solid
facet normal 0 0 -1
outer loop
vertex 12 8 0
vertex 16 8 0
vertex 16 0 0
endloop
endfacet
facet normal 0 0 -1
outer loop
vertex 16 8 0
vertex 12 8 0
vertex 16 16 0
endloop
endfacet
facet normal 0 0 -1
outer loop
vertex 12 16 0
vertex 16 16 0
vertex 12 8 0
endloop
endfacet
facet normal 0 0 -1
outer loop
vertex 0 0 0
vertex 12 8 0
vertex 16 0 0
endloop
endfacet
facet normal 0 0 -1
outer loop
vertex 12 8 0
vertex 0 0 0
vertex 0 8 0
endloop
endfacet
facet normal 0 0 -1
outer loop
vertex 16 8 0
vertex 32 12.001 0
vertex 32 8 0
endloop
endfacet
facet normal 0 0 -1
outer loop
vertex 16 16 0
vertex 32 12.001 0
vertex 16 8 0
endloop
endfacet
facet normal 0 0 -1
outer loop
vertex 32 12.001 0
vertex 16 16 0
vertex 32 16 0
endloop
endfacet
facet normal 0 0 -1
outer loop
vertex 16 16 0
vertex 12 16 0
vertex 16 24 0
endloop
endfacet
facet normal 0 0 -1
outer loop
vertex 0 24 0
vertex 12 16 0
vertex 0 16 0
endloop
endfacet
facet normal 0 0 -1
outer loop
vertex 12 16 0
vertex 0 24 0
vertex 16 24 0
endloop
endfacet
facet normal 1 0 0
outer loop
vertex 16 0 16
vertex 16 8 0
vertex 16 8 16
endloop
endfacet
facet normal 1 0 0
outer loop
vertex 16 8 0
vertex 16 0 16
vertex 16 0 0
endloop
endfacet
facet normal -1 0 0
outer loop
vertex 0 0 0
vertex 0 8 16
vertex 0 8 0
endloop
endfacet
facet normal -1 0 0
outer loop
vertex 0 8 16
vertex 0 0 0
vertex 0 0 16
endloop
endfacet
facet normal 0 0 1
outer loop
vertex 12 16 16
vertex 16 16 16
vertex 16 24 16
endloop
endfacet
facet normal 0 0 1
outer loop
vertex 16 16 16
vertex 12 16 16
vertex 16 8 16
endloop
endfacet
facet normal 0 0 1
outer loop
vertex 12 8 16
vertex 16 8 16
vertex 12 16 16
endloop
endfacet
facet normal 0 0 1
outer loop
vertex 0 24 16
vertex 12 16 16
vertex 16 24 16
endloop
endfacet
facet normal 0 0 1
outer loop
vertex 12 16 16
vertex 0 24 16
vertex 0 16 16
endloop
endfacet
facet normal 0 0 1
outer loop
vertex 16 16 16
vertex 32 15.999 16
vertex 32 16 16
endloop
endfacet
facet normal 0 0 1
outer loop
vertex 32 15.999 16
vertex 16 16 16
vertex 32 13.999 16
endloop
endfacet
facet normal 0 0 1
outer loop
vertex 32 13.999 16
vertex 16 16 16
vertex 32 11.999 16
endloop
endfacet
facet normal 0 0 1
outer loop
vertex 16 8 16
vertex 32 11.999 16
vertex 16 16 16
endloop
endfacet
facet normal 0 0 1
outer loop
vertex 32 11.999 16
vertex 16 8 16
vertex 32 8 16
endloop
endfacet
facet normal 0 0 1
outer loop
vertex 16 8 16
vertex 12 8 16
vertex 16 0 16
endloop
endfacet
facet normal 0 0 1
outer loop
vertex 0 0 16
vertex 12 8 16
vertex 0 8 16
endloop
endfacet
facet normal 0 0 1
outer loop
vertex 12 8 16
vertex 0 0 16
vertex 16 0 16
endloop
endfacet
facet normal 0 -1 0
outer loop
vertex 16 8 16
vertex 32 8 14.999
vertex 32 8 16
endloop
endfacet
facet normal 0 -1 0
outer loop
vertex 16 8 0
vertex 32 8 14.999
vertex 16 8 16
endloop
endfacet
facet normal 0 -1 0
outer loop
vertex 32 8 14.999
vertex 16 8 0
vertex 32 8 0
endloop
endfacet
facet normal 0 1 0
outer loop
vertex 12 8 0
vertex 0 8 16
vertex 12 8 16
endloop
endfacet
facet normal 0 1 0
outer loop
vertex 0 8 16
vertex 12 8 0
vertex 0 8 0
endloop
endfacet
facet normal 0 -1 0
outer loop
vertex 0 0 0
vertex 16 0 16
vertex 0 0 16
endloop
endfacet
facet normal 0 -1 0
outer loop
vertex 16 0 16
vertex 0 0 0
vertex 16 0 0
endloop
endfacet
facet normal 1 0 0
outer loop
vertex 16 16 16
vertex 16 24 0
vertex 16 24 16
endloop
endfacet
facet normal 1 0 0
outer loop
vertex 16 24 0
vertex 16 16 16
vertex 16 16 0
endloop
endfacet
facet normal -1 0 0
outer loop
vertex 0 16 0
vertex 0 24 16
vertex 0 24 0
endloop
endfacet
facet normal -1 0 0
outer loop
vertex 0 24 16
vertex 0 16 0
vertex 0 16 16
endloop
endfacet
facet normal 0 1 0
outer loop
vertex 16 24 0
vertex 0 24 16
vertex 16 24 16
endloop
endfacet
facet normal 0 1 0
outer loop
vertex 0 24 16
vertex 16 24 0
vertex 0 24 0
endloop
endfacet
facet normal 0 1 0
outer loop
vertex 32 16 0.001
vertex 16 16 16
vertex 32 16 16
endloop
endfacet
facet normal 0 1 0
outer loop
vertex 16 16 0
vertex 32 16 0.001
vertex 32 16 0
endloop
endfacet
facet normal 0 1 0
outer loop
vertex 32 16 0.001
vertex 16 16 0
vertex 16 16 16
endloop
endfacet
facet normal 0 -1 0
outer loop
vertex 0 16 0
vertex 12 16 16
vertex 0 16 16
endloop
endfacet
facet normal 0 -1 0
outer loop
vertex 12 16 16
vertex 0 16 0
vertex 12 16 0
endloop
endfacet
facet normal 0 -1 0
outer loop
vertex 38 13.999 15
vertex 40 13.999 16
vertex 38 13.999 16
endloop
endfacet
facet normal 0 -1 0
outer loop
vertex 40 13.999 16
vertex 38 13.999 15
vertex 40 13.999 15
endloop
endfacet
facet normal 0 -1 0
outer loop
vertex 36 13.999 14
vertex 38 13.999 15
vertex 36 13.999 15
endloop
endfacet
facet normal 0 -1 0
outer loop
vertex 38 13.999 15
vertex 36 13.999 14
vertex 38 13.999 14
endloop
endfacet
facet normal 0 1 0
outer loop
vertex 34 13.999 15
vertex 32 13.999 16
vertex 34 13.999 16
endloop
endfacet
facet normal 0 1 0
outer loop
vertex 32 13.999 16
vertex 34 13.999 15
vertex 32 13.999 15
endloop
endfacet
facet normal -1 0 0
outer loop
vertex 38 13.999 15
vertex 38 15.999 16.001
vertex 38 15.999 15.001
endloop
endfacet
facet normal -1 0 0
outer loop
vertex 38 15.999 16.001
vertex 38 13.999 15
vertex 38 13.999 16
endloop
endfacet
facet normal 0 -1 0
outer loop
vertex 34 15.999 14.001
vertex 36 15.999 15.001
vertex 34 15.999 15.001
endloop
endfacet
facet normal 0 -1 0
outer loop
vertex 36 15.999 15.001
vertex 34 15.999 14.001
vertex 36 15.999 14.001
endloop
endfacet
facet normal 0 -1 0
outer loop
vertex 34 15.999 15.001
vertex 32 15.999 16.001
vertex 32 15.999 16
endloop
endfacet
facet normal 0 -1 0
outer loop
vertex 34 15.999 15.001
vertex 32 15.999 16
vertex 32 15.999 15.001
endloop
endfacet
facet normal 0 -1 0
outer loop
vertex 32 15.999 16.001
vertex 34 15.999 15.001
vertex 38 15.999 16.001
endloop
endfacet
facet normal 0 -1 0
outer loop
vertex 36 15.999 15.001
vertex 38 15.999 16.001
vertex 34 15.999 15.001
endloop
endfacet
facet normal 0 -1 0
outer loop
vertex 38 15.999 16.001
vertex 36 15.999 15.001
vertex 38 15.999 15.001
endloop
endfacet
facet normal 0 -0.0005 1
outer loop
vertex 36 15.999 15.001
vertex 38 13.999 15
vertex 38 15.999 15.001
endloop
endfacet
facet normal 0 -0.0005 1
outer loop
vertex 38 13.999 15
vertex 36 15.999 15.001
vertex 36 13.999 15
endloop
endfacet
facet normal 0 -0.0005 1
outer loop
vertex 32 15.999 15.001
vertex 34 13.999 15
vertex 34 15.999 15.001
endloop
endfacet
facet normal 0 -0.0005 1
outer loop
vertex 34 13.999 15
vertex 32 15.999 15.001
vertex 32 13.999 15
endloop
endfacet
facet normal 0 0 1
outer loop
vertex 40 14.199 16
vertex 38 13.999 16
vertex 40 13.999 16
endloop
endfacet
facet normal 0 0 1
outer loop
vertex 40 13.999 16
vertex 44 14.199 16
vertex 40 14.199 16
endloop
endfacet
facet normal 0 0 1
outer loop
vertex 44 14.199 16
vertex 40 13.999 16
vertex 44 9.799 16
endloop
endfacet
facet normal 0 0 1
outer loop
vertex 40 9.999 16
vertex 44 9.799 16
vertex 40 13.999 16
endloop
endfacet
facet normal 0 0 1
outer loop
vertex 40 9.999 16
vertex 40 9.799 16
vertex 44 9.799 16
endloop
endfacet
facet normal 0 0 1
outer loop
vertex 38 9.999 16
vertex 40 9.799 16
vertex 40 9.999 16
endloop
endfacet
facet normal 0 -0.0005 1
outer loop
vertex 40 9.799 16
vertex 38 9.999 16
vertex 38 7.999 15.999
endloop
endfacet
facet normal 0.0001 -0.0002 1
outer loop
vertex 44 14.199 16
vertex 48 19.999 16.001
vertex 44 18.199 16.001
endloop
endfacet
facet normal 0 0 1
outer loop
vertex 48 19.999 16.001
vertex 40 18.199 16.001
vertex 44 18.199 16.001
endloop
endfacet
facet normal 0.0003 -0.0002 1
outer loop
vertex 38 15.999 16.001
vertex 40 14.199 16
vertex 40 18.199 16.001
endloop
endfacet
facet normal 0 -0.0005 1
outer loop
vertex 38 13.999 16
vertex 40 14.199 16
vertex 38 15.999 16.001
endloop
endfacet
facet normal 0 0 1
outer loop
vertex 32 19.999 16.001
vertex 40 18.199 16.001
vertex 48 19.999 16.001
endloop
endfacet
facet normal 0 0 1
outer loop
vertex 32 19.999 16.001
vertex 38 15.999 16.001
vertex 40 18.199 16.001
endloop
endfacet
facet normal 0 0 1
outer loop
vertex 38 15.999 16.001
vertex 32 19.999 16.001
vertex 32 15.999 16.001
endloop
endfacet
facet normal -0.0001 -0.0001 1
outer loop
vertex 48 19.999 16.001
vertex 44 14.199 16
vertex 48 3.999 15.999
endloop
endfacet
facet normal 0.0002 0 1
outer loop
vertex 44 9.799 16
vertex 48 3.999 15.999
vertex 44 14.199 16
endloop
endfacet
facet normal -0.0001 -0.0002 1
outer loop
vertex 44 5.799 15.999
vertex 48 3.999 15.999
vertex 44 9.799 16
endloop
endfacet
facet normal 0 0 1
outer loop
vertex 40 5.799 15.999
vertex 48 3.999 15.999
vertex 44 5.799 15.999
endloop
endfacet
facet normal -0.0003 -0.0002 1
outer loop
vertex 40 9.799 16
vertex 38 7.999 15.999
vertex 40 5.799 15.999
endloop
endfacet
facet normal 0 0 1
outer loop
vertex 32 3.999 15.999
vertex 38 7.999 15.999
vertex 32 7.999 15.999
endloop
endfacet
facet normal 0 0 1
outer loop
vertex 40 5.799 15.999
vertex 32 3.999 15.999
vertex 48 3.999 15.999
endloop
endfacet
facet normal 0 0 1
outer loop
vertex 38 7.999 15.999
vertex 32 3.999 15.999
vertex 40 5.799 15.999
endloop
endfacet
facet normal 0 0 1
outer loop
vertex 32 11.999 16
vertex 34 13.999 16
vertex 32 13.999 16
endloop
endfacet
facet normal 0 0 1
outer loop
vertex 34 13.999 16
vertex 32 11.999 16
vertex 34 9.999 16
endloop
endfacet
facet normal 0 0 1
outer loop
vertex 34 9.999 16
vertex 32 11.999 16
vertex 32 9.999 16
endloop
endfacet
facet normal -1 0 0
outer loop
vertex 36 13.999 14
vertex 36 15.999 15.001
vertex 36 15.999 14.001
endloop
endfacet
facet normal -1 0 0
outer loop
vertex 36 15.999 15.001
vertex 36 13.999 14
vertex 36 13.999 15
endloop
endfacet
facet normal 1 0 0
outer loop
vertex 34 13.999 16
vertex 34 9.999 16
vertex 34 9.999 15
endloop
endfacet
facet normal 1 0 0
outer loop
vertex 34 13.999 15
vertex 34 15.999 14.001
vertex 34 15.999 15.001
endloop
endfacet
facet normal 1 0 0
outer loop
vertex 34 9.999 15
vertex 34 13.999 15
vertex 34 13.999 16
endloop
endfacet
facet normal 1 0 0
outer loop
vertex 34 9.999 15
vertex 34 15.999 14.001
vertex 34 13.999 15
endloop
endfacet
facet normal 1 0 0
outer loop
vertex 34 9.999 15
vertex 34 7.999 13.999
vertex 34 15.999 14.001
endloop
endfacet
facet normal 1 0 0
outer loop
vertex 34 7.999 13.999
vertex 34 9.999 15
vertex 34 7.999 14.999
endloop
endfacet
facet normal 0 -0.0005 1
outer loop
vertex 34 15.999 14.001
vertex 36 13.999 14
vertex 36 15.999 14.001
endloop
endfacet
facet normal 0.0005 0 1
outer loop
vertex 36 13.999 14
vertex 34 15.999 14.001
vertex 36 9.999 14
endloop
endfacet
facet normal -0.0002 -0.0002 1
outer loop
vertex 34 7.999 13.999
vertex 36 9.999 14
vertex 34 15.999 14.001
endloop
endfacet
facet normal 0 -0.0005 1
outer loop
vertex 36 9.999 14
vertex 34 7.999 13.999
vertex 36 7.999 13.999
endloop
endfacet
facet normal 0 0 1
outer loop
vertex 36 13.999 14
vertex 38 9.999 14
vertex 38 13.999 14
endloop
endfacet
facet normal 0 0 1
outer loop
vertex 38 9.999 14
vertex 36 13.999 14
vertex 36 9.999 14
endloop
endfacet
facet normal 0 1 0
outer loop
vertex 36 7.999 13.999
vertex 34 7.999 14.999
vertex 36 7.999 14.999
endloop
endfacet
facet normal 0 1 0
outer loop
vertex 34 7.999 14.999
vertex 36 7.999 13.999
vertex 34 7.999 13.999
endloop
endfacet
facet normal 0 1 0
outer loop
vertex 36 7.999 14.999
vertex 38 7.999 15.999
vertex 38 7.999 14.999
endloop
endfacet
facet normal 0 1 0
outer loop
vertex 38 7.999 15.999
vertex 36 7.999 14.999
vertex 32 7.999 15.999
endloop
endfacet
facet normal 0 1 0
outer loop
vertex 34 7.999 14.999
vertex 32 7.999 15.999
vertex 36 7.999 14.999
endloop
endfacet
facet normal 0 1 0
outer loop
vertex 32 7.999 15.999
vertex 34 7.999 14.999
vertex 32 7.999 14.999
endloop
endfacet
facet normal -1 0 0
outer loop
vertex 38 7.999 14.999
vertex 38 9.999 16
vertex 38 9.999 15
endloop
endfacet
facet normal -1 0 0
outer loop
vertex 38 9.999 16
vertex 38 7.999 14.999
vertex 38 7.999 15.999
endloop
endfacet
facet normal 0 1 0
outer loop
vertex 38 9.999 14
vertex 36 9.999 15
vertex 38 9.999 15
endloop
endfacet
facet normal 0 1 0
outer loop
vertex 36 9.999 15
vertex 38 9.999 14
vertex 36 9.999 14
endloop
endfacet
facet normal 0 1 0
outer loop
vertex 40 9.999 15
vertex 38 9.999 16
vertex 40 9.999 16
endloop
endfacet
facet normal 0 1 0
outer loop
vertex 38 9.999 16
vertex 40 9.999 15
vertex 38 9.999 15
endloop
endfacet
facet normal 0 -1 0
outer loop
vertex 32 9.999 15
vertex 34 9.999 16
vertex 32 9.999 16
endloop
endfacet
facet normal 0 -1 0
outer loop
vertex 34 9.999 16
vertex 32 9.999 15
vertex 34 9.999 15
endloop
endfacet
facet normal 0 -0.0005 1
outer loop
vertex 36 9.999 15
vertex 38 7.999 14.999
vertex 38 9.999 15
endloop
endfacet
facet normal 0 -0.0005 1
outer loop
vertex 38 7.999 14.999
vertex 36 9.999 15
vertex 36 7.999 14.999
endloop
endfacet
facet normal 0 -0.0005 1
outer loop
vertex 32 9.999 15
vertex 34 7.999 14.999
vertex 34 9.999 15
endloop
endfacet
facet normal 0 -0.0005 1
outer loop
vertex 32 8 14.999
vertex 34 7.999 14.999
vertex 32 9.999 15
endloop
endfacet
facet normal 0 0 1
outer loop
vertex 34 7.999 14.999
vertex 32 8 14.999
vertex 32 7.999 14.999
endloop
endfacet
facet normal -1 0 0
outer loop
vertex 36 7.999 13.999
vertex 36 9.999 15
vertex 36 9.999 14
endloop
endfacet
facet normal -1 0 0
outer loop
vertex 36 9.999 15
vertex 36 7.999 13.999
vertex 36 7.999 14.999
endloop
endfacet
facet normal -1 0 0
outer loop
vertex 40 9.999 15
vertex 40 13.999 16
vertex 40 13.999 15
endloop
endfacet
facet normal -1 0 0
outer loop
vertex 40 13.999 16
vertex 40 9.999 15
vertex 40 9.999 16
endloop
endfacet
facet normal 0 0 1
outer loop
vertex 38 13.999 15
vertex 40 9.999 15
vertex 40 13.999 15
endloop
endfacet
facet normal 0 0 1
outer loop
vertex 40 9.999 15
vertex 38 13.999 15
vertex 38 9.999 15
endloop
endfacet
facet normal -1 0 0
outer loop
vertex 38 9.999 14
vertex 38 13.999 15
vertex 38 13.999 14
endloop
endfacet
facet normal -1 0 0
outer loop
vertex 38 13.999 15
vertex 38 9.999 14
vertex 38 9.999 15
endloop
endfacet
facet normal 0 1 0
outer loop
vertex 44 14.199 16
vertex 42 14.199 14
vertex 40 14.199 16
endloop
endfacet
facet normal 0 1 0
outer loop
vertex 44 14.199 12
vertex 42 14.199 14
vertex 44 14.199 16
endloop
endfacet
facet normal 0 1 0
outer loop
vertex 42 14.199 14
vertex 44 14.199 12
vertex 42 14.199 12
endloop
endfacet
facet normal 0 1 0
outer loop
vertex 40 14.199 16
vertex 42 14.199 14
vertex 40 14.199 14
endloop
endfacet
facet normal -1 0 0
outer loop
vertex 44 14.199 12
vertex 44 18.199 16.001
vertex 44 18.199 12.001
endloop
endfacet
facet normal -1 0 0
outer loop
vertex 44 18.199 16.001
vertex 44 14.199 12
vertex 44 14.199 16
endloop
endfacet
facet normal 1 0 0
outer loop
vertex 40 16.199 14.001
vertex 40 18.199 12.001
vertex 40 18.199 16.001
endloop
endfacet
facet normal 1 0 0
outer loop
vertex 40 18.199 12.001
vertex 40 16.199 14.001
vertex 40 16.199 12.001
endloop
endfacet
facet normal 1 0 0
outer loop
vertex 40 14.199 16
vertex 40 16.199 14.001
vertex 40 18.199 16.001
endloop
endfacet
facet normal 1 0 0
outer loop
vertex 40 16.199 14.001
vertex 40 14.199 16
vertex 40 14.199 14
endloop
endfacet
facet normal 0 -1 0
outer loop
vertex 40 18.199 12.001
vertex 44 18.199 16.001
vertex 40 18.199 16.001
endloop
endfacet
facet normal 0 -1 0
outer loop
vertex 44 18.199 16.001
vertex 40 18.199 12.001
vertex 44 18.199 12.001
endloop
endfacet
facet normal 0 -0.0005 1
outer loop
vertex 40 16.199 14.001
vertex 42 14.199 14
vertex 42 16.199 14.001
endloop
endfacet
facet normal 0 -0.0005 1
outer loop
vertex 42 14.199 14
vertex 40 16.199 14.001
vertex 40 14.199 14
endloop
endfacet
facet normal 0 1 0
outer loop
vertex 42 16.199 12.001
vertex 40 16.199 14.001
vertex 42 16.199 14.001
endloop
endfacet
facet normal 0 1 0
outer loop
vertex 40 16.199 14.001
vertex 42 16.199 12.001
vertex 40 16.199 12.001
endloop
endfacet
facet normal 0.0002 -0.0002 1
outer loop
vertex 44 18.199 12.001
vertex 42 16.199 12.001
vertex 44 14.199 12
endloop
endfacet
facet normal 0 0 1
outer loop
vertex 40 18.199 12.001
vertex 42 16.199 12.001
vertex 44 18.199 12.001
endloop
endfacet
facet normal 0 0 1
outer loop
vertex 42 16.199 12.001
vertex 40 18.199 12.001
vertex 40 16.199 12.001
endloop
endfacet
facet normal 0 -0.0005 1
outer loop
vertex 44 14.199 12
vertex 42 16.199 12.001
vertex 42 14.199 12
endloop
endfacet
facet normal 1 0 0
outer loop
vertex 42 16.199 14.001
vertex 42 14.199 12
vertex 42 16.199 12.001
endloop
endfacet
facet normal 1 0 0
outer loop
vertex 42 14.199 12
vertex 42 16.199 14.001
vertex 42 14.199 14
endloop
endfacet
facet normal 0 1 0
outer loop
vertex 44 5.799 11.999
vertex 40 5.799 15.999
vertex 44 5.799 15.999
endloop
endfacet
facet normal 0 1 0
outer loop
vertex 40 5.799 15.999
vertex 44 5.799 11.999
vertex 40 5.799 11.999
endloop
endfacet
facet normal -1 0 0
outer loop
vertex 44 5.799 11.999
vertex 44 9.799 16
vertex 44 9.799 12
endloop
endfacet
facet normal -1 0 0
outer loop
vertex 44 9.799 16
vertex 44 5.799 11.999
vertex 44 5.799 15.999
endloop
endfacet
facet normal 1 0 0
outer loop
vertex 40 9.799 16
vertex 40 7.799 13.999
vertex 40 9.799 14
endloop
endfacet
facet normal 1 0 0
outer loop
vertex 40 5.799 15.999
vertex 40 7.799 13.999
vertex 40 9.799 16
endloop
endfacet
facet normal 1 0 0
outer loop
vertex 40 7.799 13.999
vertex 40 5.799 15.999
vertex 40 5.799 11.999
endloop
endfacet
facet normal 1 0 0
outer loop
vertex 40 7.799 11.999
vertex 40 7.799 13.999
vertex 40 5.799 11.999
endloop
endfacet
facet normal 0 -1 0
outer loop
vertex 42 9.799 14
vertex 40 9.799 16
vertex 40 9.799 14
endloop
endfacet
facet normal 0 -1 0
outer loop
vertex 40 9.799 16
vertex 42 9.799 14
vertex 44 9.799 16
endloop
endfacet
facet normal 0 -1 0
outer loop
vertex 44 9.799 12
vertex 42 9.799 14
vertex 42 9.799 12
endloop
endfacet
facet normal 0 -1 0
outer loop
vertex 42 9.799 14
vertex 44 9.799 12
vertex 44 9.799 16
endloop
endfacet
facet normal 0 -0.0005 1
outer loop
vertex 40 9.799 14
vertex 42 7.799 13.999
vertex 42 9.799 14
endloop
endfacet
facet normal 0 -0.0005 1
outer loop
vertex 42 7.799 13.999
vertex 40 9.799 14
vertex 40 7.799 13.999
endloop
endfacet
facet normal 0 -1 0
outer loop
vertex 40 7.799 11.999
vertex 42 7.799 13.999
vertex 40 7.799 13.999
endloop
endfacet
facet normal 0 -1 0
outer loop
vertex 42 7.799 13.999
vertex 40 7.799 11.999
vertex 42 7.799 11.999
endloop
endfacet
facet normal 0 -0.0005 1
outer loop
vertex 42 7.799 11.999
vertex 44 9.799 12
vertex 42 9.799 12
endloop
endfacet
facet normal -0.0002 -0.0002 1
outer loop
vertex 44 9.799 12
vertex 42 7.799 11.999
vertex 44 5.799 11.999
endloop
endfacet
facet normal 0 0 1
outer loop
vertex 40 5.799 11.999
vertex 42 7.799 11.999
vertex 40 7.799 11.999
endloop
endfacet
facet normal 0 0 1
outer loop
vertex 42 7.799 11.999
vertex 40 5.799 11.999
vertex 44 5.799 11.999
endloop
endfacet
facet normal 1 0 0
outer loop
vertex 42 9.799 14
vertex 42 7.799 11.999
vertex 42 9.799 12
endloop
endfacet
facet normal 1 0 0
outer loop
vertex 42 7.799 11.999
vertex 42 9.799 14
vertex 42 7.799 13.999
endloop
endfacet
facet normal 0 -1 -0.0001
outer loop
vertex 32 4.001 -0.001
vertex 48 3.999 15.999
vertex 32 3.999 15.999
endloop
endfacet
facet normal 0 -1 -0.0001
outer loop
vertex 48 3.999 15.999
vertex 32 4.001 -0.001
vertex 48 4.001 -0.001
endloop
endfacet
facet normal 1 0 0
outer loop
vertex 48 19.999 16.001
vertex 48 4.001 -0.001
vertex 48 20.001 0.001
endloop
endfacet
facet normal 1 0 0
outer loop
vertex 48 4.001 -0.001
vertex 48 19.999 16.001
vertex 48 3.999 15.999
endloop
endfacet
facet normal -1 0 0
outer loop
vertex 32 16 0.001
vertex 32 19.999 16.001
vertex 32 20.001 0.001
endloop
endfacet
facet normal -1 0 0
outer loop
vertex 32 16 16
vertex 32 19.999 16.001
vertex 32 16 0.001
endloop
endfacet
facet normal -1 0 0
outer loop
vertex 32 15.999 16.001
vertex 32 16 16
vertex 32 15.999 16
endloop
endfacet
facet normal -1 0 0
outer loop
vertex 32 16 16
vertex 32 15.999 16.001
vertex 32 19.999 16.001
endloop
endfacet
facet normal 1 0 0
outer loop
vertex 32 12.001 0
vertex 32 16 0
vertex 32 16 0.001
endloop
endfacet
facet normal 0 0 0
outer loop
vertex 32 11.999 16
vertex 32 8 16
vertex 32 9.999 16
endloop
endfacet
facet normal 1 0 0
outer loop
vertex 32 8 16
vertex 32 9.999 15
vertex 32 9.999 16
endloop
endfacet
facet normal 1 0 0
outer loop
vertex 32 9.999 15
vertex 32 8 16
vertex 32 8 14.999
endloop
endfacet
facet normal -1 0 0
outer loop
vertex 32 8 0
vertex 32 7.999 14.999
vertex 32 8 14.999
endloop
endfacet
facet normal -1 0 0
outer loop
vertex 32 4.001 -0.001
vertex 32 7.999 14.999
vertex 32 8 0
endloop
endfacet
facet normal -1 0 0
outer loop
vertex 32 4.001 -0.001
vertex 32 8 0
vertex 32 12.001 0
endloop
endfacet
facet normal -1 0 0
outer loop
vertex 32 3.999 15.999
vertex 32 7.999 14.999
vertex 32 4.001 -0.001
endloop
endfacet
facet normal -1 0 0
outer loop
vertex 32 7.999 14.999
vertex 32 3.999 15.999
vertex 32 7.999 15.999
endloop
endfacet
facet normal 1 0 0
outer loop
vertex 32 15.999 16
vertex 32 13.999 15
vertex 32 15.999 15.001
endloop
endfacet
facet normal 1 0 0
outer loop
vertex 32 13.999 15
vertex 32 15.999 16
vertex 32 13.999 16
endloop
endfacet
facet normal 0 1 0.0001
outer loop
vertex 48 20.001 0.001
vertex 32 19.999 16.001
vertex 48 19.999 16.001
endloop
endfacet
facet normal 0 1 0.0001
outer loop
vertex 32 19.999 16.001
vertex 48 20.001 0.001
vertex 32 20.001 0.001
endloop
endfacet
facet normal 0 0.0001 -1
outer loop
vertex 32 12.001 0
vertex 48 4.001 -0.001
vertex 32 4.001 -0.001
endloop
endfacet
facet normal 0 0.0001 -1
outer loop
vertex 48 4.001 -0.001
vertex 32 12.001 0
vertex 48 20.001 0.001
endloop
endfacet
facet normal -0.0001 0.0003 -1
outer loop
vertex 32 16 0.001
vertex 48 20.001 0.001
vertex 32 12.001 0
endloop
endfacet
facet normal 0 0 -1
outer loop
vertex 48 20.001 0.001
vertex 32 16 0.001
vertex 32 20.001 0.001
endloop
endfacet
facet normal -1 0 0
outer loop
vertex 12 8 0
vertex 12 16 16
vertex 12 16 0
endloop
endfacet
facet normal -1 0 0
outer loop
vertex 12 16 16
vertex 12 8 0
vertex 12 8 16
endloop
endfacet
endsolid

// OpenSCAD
//Pixel size in millimeters
pixel_size = 2;

//Head rotation in degrees
head_angle = 270;

// For use for mold making with thing http://www.thingiverse.com/thing:31581
mold_making = true;

// Extra overlap betwen body and legs (eg for creating a mold)
extra_body_overlap=1;

real_head_angle = (mold_making == true) ? head_angle + 0.01 : head_angle;

scale(pixel_size)
{
    //make it on its side
    translate([0,0,8]) rotate([0,90,0])
    {
        union()
        {
            legs(extra_body_overlap);
            body();
            head(real_head_angle);
        }
    }
}

module legs(extra_body_overlap) {
    cube([8,4,6 + extra_body_overlap + 1]);
    translate([0,8,0]) cube([8,4,6 + extra_body_overlap + 1]);
}

module body() {
    translate([0,4,6]) cube([8,4,10]);
}

module head(rotation) {
    //head
//translate([0,2,16]) cube(8);
//eyes + mouth
translate([4, 6, 20])
    rotate([0, 0, rotation]) {
        translate([-4, -6, -20]) {
            difference()
            {
                translate([0,2,16]) {
                    // head
                    cube(8);
                    }
                union()
                {
                    //mouth
                    translate([2,2,16 - 0.1]) cube([1,0.5,3 + 0.1]);
                    translate([2,2,17]) cube(1);
                    translate([5,2,16 - 0.1]) cube([1,0.5,3 + 0.1]);
                    translate([5,2,17]) cube(1);
                    translate([3,2,17]) cube([2,0.5,3]);
                    translate([3,2,17]) cube([2,1,2]);
                    //left eye
                    translate([1 - 0.1,2,20]) cube([2,1,2]);
                    translate([1 - 0.1,2,20]) cube([1,2,2]);
                    translate([2 - 0.1,2,21]) cube([1,2,1]);
                    //right eye
                    translate([5 + 0.1,2,20]) cube([2,1,2]);
                    translate([6 + 0.1,2,20]) cube([1,2,2]);
                    translate([5 + 0.1,2,21]) cube([1,2,1]);
                }
            }
        }
    }
}
